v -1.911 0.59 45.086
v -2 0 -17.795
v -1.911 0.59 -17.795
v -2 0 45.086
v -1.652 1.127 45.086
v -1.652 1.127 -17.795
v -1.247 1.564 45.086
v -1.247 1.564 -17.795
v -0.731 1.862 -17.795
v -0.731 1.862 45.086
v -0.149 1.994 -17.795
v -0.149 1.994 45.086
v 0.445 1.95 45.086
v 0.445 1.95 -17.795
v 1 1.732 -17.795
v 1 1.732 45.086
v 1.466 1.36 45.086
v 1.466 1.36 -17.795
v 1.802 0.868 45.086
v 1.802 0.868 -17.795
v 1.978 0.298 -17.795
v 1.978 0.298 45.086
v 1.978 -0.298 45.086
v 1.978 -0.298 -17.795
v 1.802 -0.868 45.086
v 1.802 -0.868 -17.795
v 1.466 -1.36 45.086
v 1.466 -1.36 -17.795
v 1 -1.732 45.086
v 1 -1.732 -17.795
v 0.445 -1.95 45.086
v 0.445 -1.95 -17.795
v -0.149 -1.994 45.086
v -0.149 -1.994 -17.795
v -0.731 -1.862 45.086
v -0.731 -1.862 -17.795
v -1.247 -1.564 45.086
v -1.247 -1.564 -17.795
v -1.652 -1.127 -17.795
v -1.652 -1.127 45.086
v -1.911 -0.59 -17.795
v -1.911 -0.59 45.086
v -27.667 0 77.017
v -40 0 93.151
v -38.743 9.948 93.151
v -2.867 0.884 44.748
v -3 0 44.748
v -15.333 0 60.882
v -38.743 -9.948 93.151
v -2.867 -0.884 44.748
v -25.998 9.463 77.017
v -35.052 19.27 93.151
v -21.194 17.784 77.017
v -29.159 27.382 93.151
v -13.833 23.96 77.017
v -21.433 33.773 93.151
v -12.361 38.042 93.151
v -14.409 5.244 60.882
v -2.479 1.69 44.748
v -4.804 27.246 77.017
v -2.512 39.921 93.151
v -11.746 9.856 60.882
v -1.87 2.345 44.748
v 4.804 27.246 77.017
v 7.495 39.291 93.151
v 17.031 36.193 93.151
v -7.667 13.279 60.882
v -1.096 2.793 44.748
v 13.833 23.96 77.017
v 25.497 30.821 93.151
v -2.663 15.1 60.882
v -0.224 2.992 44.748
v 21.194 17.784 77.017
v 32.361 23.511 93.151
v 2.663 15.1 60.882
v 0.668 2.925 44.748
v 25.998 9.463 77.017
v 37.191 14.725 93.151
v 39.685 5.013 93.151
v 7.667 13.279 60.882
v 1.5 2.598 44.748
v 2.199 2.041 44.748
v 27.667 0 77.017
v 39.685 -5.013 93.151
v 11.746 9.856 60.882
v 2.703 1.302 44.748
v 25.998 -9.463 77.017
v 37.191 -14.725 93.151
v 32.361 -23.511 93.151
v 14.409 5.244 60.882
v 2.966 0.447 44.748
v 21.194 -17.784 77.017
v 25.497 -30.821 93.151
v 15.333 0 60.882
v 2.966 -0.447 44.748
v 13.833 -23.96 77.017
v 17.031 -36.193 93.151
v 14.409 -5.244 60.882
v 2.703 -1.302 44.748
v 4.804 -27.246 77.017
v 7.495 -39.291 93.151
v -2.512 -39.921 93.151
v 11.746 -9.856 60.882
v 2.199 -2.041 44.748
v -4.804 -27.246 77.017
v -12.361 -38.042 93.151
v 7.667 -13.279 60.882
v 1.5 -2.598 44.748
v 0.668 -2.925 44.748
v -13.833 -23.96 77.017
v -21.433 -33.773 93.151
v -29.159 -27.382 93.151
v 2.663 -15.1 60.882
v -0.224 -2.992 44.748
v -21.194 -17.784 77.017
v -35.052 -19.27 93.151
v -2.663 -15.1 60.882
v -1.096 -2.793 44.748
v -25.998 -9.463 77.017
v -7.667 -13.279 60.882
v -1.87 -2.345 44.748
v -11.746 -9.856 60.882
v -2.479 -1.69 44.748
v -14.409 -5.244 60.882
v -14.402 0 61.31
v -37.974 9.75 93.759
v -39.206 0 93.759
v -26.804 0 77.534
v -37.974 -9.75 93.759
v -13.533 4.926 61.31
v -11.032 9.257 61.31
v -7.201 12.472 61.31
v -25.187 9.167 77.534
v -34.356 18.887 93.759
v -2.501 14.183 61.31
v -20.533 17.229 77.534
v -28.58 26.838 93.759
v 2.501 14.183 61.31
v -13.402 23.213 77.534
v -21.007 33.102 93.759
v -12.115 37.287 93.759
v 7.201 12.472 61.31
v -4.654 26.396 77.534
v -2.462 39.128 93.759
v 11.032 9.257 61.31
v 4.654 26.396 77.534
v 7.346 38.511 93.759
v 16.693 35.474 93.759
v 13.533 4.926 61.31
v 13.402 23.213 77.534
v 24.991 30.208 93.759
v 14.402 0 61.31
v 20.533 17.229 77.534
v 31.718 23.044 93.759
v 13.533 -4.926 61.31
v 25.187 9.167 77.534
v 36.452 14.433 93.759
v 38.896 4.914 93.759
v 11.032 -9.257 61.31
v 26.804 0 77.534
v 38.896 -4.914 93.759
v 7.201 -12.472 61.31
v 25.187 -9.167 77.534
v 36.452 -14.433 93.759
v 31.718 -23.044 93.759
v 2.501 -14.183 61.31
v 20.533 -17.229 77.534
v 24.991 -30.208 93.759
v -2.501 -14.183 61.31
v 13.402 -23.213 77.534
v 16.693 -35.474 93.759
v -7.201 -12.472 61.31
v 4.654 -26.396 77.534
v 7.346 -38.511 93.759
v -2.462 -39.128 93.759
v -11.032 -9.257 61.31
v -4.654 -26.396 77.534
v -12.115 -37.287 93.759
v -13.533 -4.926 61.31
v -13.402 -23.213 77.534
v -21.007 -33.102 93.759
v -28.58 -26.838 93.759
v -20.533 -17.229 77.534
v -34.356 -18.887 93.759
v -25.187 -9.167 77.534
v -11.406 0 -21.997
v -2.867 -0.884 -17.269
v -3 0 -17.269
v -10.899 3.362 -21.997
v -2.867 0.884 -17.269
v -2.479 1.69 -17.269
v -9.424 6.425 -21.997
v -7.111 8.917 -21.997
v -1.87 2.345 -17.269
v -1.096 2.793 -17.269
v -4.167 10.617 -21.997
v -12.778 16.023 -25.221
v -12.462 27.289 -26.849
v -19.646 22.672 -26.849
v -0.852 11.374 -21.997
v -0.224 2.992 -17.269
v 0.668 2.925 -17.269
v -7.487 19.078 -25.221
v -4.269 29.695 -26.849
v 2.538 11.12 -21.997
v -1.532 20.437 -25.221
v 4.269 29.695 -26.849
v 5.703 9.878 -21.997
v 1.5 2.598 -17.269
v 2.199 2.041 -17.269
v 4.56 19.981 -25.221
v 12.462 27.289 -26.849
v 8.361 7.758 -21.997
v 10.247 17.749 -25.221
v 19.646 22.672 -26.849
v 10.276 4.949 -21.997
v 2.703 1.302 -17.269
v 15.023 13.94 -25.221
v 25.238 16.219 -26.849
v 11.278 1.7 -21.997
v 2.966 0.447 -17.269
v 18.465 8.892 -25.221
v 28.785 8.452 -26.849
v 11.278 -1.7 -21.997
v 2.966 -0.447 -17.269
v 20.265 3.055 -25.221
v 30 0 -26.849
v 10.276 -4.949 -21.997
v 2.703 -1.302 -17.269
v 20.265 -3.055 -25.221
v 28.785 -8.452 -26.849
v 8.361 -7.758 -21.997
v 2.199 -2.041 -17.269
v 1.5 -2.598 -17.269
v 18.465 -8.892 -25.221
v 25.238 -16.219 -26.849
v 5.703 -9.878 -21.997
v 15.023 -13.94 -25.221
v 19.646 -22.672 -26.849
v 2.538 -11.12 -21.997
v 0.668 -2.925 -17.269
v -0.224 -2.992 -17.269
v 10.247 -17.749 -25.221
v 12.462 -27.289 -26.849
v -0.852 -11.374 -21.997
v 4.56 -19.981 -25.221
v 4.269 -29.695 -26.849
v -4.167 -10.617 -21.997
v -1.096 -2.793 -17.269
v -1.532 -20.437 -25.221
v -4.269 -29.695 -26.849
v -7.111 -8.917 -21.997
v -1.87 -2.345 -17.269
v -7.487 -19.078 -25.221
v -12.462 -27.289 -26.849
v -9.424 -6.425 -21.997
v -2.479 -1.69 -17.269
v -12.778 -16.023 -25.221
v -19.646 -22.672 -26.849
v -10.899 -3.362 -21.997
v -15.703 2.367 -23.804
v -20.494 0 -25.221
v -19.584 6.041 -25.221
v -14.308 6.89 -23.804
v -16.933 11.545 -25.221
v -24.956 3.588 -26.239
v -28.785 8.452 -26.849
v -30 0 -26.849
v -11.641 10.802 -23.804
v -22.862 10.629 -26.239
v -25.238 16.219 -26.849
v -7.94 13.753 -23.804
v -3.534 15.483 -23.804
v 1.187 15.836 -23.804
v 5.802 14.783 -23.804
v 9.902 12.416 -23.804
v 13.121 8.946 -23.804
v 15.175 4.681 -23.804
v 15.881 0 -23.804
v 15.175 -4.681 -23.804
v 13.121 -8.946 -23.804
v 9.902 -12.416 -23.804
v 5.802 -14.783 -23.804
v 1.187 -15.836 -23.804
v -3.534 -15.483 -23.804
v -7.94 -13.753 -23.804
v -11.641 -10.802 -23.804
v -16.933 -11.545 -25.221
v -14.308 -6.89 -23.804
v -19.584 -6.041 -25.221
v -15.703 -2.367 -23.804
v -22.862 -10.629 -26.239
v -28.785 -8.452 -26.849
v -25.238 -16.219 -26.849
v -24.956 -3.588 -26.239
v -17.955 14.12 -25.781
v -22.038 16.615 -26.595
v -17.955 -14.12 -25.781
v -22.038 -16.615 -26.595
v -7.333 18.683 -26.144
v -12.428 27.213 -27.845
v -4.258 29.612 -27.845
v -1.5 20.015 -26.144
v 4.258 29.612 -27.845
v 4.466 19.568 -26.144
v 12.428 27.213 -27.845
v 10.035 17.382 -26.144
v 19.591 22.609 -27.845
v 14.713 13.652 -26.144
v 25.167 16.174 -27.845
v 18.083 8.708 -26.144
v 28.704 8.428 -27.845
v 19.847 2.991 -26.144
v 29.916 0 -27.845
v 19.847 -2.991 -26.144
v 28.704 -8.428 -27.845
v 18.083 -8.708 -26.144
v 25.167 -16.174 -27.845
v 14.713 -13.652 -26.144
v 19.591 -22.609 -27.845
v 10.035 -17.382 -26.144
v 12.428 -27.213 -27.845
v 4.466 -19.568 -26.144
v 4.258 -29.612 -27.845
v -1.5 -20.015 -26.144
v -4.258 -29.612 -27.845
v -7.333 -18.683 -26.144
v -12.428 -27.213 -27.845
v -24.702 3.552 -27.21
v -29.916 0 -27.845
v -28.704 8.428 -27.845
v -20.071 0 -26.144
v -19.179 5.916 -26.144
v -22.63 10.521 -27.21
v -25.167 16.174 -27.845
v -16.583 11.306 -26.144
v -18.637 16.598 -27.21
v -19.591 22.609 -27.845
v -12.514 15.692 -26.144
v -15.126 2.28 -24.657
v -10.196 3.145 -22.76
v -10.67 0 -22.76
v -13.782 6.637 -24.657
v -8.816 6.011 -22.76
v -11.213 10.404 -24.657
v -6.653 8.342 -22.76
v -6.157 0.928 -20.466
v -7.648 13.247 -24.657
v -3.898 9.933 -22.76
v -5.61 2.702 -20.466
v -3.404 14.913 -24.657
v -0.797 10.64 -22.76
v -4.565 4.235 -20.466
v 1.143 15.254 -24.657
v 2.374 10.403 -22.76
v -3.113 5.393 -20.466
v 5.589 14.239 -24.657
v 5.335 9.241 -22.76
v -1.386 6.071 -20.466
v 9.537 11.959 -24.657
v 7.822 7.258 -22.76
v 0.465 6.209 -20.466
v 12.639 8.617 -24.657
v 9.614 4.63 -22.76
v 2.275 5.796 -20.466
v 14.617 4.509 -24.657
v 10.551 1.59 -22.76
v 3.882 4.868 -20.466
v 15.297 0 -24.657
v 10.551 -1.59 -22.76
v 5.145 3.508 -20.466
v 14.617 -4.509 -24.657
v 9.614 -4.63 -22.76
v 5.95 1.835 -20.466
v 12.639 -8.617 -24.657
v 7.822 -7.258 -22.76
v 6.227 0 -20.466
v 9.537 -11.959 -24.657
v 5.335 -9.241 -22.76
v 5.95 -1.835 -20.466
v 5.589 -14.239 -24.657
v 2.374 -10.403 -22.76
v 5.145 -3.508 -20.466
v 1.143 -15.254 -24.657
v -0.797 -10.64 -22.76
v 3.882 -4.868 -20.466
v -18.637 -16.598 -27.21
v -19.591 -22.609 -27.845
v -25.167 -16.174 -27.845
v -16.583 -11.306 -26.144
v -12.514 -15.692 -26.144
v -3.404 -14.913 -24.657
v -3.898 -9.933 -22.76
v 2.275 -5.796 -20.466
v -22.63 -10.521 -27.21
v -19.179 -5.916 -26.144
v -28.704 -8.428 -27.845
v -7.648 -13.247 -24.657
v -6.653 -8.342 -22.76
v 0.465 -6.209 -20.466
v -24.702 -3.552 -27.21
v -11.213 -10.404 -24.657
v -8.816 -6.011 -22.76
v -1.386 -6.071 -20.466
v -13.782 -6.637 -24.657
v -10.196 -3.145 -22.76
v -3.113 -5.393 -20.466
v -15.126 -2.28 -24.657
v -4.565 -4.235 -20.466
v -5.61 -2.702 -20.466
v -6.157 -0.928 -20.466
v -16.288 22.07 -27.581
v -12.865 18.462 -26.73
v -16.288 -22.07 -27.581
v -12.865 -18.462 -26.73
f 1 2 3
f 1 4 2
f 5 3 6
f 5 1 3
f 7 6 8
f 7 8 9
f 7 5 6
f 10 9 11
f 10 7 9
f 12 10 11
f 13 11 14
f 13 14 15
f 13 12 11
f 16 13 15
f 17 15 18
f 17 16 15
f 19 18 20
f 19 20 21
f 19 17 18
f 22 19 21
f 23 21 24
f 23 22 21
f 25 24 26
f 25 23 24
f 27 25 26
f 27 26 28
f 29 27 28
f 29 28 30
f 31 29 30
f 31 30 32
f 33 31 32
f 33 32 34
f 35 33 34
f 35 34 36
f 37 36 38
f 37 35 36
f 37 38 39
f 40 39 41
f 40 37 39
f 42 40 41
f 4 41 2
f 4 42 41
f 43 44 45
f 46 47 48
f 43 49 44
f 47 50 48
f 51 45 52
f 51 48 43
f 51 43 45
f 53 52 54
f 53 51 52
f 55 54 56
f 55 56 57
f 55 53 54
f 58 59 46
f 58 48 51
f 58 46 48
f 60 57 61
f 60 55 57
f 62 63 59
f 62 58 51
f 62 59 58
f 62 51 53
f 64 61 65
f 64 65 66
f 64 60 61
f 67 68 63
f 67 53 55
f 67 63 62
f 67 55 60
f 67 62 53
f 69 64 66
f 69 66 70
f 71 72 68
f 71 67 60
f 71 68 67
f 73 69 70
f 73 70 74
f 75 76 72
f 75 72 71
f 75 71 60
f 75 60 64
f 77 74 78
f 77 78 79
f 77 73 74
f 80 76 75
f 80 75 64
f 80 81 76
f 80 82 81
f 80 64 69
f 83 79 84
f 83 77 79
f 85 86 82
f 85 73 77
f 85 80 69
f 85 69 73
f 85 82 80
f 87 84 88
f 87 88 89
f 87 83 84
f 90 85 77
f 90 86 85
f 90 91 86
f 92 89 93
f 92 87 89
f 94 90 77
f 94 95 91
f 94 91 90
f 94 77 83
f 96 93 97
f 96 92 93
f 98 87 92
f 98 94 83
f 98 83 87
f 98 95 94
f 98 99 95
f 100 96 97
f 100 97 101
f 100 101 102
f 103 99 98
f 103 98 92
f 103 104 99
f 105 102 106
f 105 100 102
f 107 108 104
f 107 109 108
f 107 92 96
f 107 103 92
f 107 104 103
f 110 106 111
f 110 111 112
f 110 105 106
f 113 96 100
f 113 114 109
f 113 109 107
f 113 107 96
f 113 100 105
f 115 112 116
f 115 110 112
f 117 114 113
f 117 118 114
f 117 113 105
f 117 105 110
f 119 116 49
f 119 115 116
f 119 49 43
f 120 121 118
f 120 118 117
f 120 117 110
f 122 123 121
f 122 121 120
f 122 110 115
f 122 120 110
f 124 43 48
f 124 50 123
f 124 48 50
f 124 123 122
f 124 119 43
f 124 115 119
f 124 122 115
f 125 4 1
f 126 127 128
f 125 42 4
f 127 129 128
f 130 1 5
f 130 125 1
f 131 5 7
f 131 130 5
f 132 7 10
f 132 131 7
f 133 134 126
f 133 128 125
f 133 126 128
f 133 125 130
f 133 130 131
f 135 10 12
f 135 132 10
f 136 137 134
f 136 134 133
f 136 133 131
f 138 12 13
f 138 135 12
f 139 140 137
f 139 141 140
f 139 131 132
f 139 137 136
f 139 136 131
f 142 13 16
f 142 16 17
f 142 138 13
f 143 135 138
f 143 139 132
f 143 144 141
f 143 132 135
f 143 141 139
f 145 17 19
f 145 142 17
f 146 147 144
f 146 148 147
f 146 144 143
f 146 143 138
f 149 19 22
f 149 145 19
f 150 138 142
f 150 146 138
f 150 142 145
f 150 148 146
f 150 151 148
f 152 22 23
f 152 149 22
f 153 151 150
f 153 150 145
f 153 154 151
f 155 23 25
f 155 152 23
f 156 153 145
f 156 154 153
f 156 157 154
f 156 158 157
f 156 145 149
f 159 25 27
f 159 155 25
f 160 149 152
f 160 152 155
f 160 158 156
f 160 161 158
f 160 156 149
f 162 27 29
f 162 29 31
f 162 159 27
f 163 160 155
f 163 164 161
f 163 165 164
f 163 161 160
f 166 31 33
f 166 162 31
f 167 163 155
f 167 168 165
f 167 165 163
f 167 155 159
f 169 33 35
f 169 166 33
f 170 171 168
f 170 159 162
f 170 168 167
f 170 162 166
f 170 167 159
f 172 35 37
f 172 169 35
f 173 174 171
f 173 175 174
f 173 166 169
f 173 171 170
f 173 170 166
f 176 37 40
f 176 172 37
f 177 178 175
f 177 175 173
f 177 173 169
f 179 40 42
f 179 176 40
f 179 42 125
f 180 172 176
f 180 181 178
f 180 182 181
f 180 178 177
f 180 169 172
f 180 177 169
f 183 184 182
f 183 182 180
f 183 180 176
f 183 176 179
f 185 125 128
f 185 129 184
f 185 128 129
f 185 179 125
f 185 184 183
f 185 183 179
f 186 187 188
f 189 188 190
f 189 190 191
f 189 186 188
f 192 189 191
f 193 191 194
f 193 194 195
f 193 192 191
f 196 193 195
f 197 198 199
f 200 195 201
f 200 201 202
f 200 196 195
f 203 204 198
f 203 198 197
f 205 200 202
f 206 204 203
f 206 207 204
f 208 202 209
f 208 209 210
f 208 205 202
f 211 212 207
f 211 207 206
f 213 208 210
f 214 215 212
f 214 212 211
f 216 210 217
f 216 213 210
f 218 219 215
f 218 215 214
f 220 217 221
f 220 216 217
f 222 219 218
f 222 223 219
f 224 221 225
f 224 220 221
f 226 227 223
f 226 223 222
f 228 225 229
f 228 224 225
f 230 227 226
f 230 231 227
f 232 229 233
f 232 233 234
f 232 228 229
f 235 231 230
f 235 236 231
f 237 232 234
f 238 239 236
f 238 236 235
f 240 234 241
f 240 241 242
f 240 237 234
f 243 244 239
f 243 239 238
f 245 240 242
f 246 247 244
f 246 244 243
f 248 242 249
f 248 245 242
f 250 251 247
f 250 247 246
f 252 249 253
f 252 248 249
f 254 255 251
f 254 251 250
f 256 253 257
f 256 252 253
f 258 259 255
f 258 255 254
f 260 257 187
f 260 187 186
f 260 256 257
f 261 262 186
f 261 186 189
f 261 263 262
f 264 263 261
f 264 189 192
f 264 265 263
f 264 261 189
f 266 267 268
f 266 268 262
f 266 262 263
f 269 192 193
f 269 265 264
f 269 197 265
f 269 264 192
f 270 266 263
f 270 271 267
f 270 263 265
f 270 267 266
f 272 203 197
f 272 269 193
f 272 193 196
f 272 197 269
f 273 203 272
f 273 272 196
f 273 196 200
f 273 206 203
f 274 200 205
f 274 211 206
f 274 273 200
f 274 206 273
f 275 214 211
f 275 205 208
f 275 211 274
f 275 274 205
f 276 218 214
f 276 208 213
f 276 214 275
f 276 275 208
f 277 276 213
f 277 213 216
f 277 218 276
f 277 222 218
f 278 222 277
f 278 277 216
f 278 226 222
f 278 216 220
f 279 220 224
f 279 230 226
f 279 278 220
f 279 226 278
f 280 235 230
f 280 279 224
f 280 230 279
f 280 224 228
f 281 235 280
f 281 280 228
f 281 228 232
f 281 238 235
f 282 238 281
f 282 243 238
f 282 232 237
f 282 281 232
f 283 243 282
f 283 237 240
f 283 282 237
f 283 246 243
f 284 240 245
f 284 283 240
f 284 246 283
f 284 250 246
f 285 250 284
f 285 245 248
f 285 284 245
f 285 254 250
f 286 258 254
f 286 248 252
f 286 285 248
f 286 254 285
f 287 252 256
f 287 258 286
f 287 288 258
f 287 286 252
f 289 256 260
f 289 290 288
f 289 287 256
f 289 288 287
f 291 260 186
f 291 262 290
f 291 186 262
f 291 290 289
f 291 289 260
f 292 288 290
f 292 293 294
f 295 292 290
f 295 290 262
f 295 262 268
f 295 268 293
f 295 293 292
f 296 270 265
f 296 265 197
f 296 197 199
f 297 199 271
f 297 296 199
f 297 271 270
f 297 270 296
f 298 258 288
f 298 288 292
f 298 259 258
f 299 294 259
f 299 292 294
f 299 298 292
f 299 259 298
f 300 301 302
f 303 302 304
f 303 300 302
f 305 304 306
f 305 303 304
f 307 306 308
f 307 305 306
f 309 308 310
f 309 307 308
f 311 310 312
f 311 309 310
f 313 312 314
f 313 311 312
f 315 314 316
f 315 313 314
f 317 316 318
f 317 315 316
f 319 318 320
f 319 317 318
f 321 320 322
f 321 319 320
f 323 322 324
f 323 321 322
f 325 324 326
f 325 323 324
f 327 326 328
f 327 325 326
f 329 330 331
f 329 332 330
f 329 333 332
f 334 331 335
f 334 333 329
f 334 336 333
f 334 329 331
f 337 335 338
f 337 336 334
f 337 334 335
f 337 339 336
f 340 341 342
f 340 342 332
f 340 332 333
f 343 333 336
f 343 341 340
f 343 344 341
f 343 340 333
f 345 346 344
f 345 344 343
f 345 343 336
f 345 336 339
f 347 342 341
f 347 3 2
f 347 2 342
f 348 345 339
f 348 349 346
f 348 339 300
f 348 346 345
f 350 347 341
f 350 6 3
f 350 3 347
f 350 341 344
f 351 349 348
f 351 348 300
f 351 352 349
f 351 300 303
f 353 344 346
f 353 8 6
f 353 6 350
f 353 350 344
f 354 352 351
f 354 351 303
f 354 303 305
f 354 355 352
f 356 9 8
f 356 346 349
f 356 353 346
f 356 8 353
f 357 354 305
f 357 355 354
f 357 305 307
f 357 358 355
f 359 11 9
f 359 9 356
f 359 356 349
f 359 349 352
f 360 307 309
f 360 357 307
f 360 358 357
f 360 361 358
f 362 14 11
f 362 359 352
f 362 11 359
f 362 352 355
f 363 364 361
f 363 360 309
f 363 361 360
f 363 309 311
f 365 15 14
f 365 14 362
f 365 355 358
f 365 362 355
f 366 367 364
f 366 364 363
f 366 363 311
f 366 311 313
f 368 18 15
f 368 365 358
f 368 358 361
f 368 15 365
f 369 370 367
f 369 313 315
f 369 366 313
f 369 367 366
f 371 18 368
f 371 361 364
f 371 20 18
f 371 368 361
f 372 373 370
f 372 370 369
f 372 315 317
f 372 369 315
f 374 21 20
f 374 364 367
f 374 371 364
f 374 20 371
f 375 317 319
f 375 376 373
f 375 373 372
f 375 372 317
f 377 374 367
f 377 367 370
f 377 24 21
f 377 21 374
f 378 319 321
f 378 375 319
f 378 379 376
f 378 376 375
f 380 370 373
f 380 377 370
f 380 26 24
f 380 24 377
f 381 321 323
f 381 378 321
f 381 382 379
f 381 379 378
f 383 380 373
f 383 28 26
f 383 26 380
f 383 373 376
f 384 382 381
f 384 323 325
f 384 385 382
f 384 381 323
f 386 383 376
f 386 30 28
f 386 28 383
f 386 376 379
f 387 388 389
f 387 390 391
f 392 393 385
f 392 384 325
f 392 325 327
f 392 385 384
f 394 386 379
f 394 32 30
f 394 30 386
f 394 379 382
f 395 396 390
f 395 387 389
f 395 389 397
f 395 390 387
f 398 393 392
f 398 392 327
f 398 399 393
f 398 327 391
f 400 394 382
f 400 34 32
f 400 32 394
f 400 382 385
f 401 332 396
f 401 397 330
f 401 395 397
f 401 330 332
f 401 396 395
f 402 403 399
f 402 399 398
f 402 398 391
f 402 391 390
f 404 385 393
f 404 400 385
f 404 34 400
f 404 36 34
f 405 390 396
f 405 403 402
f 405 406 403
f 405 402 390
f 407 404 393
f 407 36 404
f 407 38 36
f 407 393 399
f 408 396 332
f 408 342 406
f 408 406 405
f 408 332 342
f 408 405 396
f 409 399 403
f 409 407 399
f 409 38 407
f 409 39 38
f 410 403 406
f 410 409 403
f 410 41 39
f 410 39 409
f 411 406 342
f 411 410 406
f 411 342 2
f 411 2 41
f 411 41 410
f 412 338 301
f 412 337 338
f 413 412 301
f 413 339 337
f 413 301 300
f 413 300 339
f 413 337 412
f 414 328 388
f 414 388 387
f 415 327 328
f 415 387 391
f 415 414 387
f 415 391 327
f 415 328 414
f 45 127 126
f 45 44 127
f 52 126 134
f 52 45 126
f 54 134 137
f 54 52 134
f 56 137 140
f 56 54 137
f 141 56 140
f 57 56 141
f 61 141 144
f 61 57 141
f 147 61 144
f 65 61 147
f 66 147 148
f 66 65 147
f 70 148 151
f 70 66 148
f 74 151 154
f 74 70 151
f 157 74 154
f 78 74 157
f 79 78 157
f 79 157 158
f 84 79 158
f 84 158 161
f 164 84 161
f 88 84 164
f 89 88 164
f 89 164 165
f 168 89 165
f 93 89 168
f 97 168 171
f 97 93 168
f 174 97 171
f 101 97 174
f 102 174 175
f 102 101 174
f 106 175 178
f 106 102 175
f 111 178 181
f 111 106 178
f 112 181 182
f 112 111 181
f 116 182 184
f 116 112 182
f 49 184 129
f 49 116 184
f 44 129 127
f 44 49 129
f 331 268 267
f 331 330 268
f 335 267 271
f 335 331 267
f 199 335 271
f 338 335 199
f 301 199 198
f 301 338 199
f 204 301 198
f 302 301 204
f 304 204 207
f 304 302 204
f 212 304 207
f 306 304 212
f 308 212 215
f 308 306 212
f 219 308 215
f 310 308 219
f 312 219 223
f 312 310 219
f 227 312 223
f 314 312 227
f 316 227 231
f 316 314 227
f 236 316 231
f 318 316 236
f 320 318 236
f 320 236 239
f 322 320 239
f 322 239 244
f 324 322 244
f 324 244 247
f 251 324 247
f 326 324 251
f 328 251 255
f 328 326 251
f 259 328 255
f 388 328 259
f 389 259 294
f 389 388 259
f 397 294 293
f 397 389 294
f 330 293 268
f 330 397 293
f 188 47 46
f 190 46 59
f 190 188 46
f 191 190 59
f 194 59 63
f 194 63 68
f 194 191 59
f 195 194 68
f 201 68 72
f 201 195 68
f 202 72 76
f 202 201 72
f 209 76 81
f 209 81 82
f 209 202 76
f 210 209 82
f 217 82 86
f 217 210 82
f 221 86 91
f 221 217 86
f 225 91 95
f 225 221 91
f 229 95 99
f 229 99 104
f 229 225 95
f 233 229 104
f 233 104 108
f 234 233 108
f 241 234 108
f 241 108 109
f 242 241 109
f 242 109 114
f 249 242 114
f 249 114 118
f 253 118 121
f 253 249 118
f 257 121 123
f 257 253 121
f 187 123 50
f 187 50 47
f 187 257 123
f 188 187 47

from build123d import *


with BuildPart() as f1:
    # F0 (on Front) → F1 (revolve)
    with BuildSketch(Plane.XZ):
        with BuildLine():
            Line((-39.205529, 93.758564), (-40, 93.151263))
            Line((-40, 93.151263), (-3, 44.747897))
            Line((-3, 44.747897), (-3, -17.268907))
            ThreePointArc((-3, -17.268907), (-15.880826, -23.803916), (-30, -26.848737))
            Line((-30, -26.848737), (-29.916253, -27.845224))
            ThreePointArc((-29.916253, -27.845224), (-15.296707, -24.657094), (-2, -17.794671))
            Line((-2, -17.794671), (-2, 45.086327))
            Line((-2, 45.086327), (-39.205529, 93.758564))
        make_face()
    revolve(axis=Axis((0, 0, 33.025213), (0, 0, -1)))


solid = f1.part
